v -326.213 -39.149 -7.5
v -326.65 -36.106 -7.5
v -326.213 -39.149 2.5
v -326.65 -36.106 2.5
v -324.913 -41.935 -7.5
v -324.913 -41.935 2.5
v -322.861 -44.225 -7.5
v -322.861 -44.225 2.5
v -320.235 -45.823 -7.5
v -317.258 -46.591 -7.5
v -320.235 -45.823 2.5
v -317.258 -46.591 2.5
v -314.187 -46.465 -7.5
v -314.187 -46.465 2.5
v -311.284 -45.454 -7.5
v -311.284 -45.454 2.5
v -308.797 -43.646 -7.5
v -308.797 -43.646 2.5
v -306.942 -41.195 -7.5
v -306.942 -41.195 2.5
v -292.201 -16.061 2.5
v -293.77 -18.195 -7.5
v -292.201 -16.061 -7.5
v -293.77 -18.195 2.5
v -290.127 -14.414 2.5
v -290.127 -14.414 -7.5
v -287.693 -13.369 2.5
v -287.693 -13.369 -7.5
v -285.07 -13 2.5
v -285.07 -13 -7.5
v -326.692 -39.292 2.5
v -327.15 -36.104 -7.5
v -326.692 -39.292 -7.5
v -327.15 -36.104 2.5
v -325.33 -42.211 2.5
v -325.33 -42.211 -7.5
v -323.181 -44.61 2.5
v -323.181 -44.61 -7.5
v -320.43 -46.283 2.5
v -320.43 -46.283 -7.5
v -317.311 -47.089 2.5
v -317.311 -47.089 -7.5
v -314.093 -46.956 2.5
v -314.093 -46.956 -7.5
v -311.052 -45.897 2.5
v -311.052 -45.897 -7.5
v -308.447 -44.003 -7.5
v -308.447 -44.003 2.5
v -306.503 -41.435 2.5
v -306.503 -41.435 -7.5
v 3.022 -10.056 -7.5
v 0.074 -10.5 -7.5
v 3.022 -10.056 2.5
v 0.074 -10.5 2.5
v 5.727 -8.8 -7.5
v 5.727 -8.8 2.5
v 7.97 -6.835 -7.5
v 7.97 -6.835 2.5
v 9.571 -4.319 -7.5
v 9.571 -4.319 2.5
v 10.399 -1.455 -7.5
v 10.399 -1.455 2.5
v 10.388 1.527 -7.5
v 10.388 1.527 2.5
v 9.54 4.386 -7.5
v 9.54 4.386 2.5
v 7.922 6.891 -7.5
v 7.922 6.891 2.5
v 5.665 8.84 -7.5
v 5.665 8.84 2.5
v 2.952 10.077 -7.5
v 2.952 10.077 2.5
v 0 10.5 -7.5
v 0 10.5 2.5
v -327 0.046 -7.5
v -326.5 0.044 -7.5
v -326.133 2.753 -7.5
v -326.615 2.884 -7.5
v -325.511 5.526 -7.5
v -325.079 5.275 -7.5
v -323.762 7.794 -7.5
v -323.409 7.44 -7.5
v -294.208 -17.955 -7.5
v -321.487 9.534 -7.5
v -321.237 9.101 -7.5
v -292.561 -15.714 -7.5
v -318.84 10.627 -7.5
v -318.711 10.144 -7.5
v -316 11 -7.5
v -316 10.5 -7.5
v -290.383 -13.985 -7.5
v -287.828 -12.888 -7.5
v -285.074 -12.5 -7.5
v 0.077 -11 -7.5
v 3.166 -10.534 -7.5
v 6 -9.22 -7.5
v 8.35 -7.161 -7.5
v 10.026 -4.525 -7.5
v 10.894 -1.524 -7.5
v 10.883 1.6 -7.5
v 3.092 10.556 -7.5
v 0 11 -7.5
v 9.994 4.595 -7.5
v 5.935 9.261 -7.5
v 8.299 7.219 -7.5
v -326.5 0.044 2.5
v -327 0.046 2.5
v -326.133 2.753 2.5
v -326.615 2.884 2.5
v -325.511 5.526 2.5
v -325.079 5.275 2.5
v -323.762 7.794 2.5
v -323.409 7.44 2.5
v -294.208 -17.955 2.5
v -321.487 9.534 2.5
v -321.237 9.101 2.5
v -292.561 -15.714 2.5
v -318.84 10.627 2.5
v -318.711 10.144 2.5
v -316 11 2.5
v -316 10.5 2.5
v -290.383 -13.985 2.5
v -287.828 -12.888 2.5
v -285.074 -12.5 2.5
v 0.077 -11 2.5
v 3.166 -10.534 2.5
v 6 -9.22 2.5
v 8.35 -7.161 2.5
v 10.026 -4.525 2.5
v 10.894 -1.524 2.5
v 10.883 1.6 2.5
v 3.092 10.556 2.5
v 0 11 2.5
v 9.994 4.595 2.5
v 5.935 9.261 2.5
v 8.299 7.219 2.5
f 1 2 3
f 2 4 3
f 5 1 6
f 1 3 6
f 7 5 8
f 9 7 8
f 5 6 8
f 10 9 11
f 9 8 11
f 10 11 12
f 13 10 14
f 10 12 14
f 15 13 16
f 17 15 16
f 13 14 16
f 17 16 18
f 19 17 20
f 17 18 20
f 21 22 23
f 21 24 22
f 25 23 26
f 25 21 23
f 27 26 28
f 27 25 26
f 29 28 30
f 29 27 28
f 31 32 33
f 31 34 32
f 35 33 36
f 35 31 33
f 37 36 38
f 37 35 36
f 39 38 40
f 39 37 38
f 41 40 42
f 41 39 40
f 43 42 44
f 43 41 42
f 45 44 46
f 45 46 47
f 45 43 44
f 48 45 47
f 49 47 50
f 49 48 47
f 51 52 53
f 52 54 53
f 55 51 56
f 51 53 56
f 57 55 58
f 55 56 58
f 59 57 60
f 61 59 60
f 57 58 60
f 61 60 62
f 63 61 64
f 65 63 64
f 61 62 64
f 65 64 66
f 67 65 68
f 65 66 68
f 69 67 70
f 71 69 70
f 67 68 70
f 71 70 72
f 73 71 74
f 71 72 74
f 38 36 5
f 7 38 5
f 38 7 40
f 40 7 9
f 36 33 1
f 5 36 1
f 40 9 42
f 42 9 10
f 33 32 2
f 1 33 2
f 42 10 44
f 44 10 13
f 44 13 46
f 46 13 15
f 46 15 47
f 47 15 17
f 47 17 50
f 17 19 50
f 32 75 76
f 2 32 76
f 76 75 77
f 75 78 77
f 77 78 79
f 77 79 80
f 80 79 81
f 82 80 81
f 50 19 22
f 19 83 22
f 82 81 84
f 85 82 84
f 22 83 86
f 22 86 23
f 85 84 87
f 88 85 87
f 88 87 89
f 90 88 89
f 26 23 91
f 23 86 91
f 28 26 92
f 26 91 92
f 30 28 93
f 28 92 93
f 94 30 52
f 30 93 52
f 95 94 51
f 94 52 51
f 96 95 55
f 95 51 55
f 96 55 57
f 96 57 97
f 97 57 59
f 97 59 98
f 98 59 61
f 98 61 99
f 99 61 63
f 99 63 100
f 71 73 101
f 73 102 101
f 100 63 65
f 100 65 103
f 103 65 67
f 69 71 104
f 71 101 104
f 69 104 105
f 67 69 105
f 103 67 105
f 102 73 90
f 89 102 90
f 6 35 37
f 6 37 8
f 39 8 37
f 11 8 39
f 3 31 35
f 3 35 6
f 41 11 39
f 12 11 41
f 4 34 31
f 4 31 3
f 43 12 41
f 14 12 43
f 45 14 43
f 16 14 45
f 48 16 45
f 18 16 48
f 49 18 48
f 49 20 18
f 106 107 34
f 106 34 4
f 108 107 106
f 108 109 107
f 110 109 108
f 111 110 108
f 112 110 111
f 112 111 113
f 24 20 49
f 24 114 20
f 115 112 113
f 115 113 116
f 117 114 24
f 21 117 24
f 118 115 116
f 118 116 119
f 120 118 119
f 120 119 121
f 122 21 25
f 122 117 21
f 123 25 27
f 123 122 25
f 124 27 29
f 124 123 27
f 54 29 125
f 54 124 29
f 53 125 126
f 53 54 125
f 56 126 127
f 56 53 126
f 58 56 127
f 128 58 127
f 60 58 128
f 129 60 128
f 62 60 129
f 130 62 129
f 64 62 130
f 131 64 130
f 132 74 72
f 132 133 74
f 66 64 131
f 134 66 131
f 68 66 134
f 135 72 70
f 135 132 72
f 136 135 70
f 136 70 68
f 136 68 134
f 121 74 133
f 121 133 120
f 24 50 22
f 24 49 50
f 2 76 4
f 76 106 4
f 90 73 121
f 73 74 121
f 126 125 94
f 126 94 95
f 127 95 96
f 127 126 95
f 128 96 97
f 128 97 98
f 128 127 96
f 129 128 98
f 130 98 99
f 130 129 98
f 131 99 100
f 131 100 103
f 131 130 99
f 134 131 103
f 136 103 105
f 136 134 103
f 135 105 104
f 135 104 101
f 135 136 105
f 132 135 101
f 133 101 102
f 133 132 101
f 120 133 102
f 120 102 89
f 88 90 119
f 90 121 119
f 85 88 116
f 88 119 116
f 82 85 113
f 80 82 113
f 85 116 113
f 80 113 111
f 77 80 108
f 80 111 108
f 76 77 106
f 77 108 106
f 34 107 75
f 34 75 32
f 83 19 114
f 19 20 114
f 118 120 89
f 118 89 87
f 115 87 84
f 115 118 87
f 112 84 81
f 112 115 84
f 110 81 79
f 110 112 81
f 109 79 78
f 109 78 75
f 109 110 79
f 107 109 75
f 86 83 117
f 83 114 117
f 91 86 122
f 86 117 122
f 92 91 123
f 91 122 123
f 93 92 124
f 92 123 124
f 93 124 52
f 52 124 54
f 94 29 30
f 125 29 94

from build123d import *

# Parameters (mm, degrees)
EXTRUDE_THIN1_START = -2.5
EXTRUDE_THIN1_DEPTH = 5


with BuildPart() as part:
    # Sketch2 → Extrude-Thin1 (new, symmetric)
    with BuildSketch(Plane.XY.offset(EXTRUDE_THIN1_START)):
        with BuildLine():
            Line((-285.070155578, -13.000246093), (0.077171136, -10.999729297))
            ThreePointArc((0.077171136, -10.999729297), (10.999932323, 0.038585806), (0, 11))
            Line((0, 11), (-316, 11))
            ThreePointArc((-316, 11), (-323.762020666, 7.794295041), (-326.999905306, 0.045642761))
            Line((-326.999905306, 0.045642761), (-327.149905306, -36.104357239))
            ThreePointArc((-327.149905306, -36.104357239), (-318.900034366, -46.800695329), (-306.503020259, -41.435431097))
            Line((-306.503020259, -41.435431097), (-293.769981583, -18.195062639))
            ThreePointArc((-293.769981583, -18.195062639), (-290.126747116, -14.414170744), (-285.070155578, -13.000246093))
        make_face()
        with BuildLine():
            Line((-285.073663357, -12.500258398), (0.073663357, -10.499741602))
            ThreePointArc((0.073663357, -10.499741602), (10.499935399, 0.036831905), (0, 10.5))
            Line((0, 10.5), (-316, 10.5))
            ThreePointArc((-316, 10.5), (-323.409201545, 7.440008903), (-326.49990961, 0.04356809))
            Line((-326.49990961, 0.04356809), (-326.64990961, -36.10643191))
            ThreePointArc((-326.64990961, -36.10643191), (-318.775032804, -46.316572814), (-306.941519338, -41.195184229))
            Line((-306.941519338, -41.195184229), (-294.208480662, -17.954815771))
            ThreePointArc((-294.208480662, -17.954815771), (-290.383084472, -13.984879282), (-285.073663357, -12.500258398))
        make_face(mode=Mode.SUBTRACT)
    extrude(amount=EXTRUDE_THIN1_DEPTH, both=True)


solid = part.part
